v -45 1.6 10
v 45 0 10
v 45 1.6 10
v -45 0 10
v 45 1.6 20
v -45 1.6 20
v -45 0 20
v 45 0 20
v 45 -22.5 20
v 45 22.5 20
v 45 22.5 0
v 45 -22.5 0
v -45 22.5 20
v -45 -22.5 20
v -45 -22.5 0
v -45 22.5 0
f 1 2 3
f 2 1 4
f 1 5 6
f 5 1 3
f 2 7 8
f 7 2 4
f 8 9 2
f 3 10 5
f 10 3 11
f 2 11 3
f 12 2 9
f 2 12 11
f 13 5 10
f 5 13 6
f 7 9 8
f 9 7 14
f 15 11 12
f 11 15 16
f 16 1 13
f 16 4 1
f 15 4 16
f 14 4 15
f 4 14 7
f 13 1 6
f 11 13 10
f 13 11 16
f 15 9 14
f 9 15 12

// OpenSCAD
// Slide drying rack - holds 10 microscope slides standing upright on their long edge
// Units: mm. Print orientation: base on XY plane, building up +Z.

// ---- Block ----
block_len   = 90;    // block length along X
block_wid   = 45;    // block width along Y
block_ht    = 20;    // block height along Z

// ---- Slots ----
slot_count  = 10;    // number of slide slots
slot_len    = 77;    // slot length along X (slide length + clearance)
slot_wid    = 1.6;   // slot width along Y
slot_depth  = 10;    // slot depth from top face along -Z
slot_pitch  = 3.5;   // centre-to-centre spacing along Y
eps         = 0.5;   // overshoot past cut faces to avoid coplanar faces

$fn = 64;

difference() {
    // Base block, centred in X and Y, resting on z = 0
    translate([-block_len/2, -block_wid/2, 0])
        cube([block_len, block_wid, block_ht]);

    // Parallel slot group, centred on the block in X and Y
    for (i = [0 : slot_count - 1]) {
        x = (i - (slot_count - 1)/2) * slot_pitch;
        translate([x - slot_len/2, 0, block_ht - slot_depth])
            cube([slot_len, slot_wid, slot_depth + eps]);
    }
}
